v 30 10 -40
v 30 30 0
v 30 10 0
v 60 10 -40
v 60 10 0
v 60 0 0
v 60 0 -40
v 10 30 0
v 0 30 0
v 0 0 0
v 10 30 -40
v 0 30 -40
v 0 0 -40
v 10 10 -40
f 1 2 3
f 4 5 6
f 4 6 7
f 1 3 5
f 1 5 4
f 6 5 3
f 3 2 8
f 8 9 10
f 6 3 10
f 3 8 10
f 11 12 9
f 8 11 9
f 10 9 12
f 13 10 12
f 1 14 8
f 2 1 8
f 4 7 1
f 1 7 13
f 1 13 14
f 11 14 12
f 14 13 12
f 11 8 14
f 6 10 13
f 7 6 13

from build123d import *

# Parameters (mm, degrees)
SKETCH1_W           = 40
SKETCH1_H           = 30
BOSS_EXTRUDE2_DEPTH = 10
SKETCH1_4_W         = 40
SKETCH1_4_H         = 10
BOSS_EXTRUDE3_DEPTH = 60
BOSS_EXTRUDE4_DEPTH = 30


with BuildPart() as part:
    # Sketch1 → Boss-Extrude2 (new body)
    with BuildSketch(Plane(origin=(0, 0, 0), x_dir=(0, 0, -1), z_dir=(1, 0, 0))):
        with Locations((20, 15)):
            Rectangle(SKETCH1_W, SKETCH1_H)
    extrude(amount=BOSS_EXTRUDE2_DEPTH)

    # Sketch1<4> → Boss-Extrude3 (add)
    with BuildSketch(Plane(origin=(0, 0, 0), x_dir=(0, 0, -1), z_dir=(1, 0, 0))):
        with Locations((20, 5)):
            Rectangle(SKETCH1_4_W, SKETCH1_4_H)
    extrude(amount=BOSS_EXTRUDE3_DEPTH)

    # Sketch1<6> → Boss-Extrude4 (add)
    with BuildSketch(Plane(origin=(0, 0, 0), x_dir=(0, 0, -1), z_dir=(1, 0, 0))):
        Polygon((0, 30), (0, 10), (40, 10), align=None)
    extrude(amount=BOSS_EXTRUDE4_DEPTH)


solid = part.part
